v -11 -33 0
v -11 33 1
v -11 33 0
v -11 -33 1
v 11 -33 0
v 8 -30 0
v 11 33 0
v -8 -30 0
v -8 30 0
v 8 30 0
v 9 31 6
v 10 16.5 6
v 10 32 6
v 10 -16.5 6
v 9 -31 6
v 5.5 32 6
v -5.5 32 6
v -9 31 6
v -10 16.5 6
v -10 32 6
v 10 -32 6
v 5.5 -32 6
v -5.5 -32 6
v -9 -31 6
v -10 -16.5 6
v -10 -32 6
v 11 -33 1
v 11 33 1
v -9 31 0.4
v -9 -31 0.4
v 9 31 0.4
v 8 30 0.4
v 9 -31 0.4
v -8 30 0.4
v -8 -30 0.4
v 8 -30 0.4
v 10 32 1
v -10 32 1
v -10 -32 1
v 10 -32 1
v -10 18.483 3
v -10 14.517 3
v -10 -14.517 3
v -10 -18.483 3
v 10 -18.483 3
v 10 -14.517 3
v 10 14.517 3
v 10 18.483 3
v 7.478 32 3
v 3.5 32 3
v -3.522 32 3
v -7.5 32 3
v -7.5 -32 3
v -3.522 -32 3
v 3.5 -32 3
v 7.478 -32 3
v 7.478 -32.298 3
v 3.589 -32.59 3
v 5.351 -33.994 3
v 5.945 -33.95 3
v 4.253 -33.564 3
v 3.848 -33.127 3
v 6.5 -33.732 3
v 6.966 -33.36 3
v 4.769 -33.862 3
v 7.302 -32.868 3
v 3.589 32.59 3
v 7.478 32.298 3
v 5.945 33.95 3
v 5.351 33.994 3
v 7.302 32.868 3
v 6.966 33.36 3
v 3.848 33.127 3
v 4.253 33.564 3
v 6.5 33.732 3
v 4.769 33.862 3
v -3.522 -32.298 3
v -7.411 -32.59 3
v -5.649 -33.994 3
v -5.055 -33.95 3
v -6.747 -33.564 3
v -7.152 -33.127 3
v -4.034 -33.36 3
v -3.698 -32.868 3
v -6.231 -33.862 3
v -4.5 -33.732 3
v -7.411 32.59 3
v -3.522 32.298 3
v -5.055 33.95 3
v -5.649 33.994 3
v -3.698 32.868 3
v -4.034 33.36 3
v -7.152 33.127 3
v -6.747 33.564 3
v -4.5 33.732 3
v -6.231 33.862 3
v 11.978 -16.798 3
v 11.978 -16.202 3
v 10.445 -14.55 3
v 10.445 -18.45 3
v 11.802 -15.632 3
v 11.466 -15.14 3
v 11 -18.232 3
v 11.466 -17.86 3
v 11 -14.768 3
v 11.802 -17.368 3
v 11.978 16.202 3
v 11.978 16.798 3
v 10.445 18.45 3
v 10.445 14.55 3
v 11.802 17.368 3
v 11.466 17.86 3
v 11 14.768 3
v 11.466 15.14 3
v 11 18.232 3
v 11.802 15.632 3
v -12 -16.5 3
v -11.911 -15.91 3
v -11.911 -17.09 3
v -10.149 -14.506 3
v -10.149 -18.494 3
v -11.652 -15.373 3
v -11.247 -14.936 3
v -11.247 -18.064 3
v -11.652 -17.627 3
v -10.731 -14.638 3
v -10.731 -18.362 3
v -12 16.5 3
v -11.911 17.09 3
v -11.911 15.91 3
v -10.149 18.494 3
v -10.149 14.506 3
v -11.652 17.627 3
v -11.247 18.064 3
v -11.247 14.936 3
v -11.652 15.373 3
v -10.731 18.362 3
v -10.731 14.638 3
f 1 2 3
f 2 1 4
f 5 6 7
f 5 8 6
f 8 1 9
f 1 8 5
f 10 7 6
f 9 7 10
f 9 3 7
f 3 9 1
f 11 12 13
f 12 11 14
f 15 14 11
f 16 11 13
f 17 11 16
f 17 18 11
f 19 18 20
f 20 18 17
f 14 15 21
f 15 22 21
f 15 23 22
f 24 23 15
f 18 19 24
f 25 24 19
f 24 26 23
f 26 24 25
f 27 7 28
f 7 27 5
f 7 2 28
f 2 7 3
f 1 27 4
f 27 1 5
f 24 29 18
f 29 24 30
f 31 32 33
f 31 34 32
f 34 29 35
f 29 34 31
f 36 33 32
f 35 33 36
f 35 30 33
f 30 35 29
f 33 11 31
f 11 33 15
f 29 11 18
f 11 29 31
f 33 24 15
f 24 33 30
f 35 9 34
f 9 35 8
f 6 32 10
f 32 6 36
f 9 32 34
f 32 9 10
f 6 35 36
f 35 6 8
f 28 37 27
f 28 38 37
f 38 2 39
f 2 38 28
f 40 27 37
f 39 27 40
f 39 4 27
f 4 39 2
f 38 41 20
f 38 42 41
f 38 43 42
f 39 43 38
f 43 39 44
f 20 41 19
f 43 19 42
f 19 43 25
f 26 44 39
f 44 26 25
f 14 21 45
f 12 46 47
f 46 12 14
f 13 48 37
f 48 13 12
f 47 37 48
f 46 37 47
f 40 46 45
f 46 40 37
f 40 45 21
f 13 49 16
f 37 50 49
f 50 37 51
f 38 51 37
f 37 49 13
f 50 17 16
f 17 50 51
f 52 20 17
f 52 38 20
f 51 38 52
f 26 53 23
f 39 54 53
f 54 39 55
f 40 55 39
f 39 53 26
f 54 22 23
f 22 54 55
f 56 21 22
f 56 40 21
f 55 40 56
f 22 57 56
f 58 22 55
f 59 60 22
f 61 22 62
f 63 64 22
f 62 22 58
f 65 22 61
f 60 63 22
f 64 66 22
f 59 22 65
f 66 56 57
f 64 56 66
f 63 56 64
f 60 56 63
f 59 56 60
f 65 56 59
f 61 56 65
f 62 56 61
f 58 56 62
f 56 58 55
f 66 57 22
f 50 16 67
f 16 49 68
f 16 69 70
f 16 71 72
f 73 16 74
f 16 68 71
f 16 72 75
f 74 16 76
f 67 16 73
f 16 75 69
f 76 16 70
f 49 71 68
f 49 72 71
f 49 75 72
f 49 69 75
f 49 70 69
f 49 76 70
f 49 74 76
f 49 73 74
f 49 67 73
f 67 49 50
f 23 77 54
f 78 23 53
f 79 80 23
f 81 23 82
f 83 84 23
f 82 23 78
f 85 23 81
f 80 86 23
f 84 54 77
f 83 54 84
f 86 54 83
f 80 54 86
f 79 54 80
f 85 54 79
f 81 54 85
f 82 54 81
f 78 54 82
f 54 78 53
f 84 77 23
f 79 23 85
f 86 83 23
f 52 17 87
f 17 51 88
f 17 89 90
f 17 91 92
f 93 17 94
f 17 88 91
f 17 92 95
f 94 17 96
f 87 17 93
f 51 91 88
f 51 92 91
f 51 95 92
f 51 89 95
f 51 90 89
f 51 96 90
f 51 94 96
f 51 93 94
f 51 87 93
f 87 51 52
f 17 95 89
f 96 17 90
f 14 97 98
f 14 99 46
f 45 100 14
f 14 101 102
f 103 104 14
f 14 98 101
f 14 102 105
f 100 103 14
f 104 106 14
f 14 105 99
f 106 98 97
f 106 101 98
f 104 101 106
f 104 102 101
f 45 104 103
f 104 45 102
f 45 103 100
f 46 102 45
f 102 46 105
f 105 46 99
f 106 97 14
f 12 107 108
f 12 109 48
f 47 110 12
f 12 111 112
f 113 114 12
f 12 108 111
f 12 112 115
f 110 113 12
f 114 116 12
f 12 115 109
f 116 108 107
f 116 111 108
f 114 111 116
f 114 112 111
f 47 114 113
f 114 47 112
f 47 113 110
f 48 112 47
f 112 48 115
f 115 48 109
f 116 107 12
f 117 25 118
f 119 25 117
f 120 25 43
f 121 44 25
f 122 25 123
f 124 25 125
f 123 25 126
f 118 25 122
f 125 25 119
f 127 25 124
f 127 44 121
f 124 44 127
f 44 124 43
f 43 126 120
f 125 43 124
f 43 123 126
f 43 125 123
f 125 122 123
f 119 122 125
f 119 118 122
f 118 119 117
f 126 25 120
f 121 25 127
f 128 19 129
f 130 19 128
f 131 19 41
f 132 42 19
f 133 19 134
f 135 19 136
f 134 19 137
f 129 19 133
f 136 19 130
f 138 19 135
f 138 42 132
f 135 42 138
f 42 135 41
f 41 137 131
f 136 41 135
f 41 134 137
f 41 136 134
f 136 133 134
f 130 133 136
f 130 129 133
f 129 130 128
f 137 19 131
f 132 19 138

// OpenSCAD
// [FL_INDEX: keywords="openscad, 3d_parametric, Customizable_LCD_frame_generator, csg_solid" | COT="Parametric OpenSCAD design from 3DCodeverse"]
// Title: Customizable LCD frame generator

/*
Create a LCD frame for 3D printing
Create by Dave Borghuis / zeno4ever
Version : 1.1
Date : 10-02-2023
For sugestions email me at : zeno4ever@gmail.com
*/

//Size of LCD
lcd_horizontal = 62;
lcd_vertical = 18;

//border around the frame
lcd_frame = 4;

//border inside frame, set to 0 to disable
lcd_inner = 2;

//hight of the frame
frame_hight = 6;

//for barb thickness of used material
material_thickness = 1; 

wall_thickness = 2*1; //wall thickness * 1 to disable for thiniverse customise

//internal parameters
frame_horizontal = lcd_horizontal+lcd_frame;
frame_vertical = lcd_vertical+lcd_frame;
lcd_inner_thickness = 2*0.2; //2 layers



barb_size = 2*1; //with of barb (top)
barb_size_b = 0; //with of barb (bottom) barb_size/2;

//set resolution
$fs = 0.6*1; 

//make frame
module makeframe () {
	difference () {
		difference () {	//inner frame
			cube(size = [frame_vertical,frame_horizontal,frame_hight],center=true);
			translate([0,0,-lcd_inner_thickness]) cube(size = [lcd_vertical,lcd_horizontal,frame_hight],center=true);
            
        	translate([0,0,0]) cube(size = [lcd_vertical-lcd_inner,lcd_horizontal-lcd_inner,frame_hight],center=true);
        
            
            
		}	

		translate([0,0,-wall_thickness]) difference () {	//outer frame
			cube(size = [frame_vertical+wall_thickness,frame_horizontal+wall_thickness,frame_hight+wall_thickness],center=true);        
            
        translate([0,0,0]) 			cube(size = [lcd_vertical+wall_thickness,lcd_horizontal+wall_thickness,frame_hight+wall_thickness],center=true);
            
		}
	}
    
    //inner frame 
    if (false) {
        #translate([0,0,-1]) 			cube(size = [lcd_vertical+wall_thickness,lcd_horizontal+wall_thickness,frame_hight+wall_thickness],center=true);
    
    
    }


	//make barbs
	fz = -(frame_hight)/2;

	//side brad
	fx = frame_vertical/4;
	fy = (lcd_horizontal+wall_thickness)/2;

	//top/bottom brad
	fx2 = (lcd_vertical+wall_thickness)/2;
	fy2 = frame_horizontal/4;

	difference () {
		union () {
			for (factorx = [-1,1]) {
				for (factory = [-1,1]) {
					translate ([factorx*fx ,factory*fy,fz]) barb();
				}
			}

			for (factorx = [-1,1]) {
				for (factory = [-1,1]) {
					translate ([factorx*fx2 ,factory*fy2,fz]) barb();
				}
			}
		}
		cube(size = [lcd_vertical,lcd_horizontal,frame_hight],center=true);
	};
};


module barb() {
	cylinder(h = frame_hight-material_thickness-wall_thickness, r1 = barb_size_b, r2 = barb_size, center = false);
};


translate([0,0,frame_hight/2]) rotate ([0,180,0]) makeframe();
